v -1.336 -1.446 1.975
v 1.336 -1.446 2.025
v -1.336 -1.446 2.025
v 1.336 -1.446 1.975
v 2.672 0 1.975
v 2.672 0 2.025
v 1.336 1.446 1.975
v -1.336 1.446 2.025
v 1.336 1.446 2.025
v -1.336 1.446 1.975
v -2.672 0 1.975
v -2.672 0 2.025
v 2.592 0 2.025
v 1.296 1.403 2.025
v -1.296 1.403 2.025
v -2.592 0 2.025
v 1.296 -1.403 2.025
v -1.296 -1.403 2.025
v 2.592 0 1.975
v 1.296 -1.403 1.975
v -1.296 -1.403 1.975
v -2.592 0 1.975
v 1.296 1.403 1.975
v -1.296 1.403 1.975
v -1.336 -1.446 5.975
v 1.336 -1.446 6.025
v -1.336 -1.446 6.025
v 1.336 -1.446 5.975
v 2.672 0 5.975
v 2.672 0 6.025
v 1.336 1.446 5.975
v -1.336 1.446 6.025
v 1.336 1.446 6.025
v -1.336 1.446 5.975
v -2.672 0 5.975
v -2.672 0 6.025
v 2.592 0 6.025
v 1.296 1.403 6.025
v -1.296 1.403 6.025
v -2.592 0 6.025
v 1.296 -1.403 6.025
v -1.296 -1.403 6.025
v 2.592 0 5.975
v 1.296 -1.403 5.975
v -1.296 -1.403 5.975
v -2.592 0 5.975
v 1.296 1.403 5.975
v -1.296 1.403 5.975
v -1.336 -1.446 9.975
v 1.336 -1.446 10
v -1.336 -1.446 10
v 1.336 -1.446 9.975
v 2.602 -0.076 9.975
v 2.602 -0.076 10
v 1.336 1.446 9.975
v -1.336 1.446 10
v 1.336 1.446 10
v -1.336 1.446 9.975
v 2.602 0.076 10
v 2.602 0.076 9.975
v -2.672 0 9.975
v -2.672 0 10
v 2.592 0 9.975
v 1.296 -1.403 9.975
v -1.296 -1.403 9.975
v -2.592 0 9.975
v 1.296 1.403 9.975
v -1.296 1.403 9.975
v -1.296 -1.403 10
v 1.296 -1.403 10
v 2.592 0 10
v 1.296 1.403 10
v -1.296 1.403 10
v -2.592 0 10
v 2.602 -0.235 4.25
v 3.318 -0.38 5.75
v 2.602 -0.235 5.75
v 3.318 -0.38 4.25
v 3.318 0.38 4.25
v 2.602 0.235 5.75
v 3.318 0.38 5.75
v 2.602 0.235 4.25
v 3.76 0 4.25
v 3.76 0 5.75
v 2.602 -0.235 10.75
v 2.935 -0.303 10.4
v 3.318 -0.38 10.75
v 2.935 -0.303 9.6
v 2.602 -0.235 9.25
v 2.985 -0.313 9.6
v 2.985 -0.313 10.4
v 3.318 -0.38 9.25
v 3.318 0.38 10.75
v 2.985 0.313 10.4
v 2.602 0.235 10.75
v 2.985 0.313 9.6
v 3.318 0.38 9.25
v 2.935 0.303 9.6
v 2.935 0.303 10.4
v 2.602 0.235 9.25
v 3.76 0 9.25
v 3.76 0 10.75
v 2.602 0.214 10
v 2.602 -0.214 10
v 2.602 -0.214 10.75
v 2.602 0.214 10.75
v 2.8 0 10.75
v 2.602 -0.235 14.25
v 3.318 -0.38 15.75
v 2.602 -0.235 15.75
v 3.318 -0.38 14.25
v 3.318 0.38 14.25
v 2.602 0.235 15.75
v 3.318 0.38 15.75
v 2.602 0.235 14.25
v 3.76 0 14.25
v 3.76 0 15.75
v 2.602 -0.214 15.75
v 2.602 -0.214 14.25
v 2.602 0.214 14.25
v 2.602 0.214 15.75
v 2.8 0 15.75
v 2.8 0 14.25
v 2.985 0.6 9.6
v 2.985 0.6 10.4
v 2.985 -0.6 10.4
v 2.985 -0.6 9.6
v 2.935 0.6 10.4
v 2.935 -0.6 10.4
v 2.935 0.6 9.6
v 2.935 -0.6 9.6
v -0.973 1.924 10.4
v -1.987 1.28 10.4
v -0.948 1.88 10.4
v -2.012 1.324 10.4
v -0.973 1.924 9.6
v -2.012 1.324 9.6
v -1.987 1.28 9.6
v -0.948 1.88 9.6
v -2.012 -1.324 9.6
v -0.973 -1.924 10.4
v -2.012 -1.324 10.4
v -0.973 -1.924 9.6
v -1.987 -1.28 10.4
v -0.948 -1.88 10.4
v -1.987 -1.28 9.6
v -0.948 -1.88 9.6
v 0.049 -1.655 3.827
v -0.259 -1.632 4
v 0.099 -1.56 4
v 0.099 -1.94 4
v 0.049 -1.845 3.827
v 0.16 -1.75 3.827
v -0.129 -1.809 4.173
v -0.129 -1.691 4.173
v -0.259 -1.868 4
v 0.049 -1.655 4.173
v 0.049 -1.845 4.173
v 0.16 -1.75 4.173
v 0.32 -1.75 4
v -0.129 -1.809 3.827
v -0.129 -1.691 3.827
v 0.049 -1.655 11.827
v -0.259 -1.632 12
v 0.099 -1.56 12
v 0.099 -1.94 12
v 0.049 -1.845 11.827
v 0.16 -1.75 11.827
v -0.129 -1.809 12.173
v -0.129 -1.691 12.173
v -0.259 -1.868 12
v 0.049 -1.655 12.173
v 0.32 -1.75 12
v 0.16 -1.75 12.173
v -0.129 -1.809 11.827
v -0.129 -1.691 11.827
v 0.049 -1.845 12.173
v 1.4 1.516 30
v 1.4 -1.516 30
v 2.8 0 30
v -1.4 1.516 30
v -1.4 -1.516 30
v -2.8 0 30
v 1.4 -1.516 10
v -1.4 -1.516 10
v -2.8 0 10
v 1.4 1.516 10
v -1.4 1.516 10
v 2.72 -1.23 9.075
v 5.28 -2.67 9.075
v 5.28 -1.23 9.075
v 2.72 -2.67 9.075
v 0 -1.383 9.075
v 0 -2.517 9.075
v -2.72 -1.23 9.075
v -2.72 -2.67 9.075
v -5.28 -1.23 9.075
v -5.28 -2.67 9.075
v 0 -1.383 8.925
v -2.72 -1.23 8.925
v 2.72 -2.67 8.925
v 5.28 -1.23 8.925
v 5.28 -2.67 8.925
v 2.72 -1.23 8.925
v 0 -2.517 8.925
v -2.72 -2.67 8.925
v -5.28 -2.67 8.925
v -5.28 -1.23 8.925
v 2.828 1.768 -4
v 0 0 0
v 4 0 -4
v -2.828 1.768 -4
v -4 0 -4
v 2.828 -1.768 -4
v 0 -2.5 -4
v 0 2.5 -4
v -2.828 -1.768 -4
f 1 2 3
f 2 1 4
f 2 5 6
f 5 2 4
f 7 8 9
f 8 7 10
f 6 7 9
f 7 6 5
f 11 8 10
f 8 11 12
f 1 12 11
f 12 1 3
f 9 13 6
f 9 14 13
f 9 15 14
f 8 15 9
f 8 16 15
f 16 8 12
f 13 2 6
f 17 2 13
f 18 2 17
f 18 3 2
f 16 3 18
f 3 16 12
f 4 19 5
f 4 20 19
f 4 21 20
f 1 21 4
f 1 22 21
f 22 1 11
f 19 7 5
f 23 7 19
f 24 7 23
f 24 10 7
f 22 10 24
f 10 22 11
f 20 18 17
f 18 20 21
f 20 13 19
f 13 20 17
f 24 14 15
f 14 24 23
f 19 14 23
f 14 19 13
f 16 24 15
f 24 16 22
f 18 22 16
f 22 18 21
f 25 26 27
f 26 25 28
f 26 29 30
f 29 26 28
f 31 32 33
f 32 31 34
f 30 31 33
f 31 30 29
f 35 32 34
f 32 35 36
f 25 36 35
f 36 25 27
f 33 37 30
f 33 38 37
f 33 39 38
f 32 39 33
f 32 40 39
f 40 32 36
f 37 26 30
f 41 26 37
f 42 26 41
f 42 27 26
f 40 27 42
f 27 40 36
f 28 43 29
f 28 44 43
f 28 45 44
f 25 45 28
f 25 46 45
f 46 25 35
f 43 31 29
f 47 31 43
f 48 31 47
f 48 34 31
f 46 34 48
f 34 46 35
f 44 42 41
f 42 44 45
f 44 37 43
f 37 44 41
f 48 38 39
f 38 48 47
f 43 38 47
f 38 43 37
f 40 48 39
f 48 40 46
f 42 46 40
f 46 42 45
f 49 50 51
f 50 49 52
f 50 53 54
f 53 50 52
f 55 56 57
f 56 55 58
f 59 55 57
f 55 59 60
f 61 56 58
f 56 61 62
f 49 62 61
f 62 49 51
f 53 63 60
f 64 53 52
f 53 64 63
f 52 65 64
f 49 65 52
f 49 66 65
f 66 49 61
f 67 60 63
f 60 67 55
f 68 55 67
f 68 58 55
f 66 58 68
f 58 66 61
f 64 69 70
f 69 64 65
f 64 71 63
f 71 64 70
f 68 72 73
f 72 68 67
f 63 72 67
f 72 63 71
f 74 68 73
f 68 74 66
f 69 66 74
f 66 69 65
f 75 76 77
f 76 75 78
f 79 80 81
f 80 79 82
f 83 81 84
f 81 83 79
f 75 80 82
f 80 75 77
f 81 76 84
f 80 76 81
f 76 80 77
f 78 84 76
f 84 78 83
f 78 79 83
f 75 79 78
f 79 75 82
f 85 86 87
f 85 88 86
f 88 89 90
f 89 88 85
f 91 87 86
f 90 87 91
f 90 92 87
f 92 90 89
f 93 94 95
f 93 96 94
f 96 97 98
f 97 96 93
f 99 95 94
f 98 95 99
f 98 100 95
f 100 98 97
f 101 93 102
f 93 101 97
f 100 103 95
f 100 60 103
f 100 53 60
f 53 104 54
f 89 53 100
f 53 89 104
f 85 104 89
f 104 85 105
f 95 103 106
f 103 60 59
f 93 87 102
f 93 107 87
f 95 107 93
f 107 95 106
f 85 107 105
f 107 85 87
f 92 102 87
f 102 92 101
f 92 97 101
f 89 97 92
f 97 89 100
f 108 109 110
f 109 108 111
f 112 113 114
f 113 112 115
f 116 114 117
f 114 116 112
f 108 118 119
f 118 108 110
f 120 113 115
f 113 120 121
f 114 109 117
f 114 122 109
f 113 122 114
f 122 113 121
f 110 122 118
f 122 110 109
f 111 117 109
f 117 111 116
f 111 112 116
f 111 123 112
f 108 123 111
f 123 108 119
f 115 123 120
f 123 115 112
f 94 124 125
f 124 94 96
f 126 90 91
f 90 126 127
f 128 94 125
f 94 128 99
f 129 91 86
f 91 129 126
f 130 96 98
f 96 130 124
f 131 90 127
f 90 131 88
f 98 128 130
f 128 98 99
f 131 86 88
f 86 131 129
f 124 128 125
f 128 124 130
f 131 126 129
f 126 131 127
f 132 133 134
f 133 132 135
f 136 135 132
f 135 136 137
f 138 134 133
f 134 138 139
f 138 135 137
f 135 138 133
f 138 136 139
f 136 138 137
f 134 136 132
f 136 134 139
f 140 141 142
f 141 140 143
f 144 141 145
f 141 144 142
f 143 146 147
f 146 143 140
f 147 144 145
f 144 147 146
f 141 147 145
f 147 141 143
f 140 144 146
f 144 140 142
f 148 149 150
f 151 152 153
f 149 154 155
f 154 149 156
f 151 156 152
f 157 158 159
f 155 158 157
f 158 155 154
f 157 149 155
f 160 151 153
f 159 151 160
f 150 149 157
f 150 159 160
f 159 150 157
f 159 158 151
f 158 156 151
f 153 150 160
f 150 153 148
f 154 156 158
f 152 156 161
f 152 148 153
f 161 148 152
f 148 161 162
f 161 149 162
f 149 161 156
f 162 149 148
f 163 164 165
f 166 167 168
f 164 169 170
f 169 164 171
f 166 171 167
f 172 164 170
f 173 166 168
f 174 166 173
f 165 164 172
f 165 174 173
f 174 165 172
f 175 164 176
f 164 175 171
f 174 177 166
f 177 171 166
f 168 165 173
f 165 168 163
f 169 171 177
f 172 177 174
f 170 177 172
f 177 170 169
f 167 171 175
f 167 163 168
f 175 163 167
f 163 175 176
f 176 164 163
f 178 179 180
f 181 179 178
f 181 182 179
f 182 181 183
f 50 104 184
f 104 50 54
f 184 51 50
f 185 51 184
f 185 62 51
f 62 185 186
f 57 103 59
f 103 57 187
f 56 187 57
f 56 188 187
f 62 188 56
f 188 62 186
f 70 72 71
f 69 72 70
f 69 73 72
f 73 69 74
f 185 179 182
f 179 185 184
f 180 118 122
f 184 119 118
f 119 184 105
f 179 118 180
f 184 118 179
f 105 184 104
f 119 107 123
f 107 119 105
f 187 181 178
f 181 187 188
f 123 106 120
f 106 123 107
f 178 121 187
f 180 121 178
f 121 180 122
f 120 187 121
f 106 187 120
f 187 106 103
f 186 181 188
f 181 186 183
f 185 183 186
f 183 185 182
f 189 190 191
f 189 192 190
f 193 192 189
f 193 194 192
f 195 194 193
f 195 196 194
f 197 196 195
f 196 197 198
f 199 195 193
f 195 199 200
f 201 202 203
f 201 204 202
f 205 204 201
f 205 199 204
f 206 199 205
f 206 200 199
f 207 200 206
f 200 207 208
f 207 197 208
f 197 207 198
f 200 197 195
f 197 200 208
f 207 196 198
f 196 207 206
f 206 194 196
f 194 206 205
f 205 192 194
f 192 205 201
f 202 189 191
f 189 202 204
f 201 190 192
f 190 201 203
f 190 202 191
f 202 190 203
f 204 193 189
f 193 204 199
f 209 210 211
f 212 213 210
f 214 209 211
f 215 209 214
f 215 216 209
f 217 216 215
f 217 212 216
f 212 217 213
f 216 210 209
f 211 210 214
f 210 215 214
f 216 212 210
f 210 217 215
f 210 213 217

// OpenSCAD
// Parámetros generales
FUSELAGE_LENGTH = 20;
FUSELAGE_RADIUS = 1.35;
scale_x = 1.6;
scale_y = 1.0;

// Módulo cono para propulsión
module cone(r, h) {
    cylinder(h=h, r1=r, r2=0, center=true);
}

// Fuselaje ovalado: cilindro escalado + algunos detalles
module fuselage_oval() {
    color([0.25, 0.41, 0.88])  // Azul real
        translate([0,0,FUSELAGE_LENGTH/2])
            scale([scale_x, scale_y, 1])
                cylinder(h=FUSELAGE_LENGTH, r=FUSELAGE_RADIUS + 0.3, center=false);

    // Anillos estructurales (simples)
    for (z = [2, 6, 10, 14, 18]) {
        color([0.41, 0.41, 0.41])
            translate([0, 0, z])
                scale([scale_x, scale_y, 1])
                    torus_ring(FUSELAGE_RADIUS + 0.32, 0.05);
    }

    // Compartimentos cilíndricos externos
    for (z = [5, 10, 15]) {
        color([0.54, 0.27, 0.07])
            translate([(FUSELAGE_RADIUS + 0.6) * scale_x, 0, z])
                scale([scale_x, scale_y, 1])
                    cylinder(h=1.5, r=0.4, center=true);
    }

    // Kevlar layer (translúcido dorado)
    color([0.72, 0.53, 0.04, 0.3])
        translate([0, 0, FUSELAGE_LENGTH / 2])
            scale([scale_x, scale_y, 1])
                cylinder(h=FUSELAGE_LENGTH, r=FUSELAGE_RADIUS + 0.4, center=false);

    // Escudos (aletas)
    for (i = [0 : 2]) {
        angle = i * 120; // grados
        x = cos(angle) * (FUSELAGE_RADIUS + 0.5) * scale_x;
        y = sin(angle) * (FUSELAGE_RADIUS + 0.5) * scale_y;
        color([0.66, 0.66, 0.66, 0.8])
            translate([x, y, FUSELAGE_LENGTH / 2])
                rotate([0, 0, angle])
                    cube([0.05, 1.2, 0.8], center=true);
    }

    // Sensores adicionales
    for (z = [4, 12]) {
        color("orange")
            translate([0, -(FUSELAGE_RADIUS + 0.4)*scale_y, z])
                scale([scale_x, scale_y, 1])
                    sphere(r=0.2);
    }
}

// Función para crear un torus simple (ring) en OpenSCAD
// Approximate with difference of two cylinders
module torus_ring(outer_r, thickness) {
    difference() {
        cylinder(h=thickness, r=outer_r, center=true);
        cylinder(h=thickness+0.1, r=outer_r - thickness, center=true);
    }
}

// Alas ovaladas
module wings_oval() {
    wing_length = 8;
    wing_width = 2.4;
    wing_thickness = 0.15;

    // ala izquierda
    translate([-wing_length/2, -(FUSELAGE_RADIUS + 0.6)*scale_y, FUSELAGE_LENGTH * 0.45])
        scale([scale_x, scale_y, 1])
            color("steelblue")
                hull() {
                    translate([0, 0, 0])
                        cube([wing_length*0.2, wing_width*0.6, wing_thickness], center=true);
                    translate([wing_length/2, 0, 0])
                        cube([wing_length*0.2, wing_width*0.3, wing_thickness], center=true);
                }

    // ala derecha (simétrica)
    translate([wing_length/2, -(FUSELAGE_RADIUS + 0.6)*scale_y, FUSELAGE_LENGTH * 0.45])
        scale([scale_x, scale_y, 1])
            color("steelblue")
                hull() {
                    translate([0, 0, 0])
                        cube([wing_length*0.2, wing_width*0.6, wing_thickness], center=true);
                    translate([-wing_length/2, 0, 0])
                        cube([wing_length*0.2, wing_width*0.3, wing_thickness], center=true);
                }
}

// Payload de propulsión (cono invertido)
module propulsion_payload() {
    base_radius = 2.5;
    height = 4;

    translate([0, 0, -height/2])
        color("dimgray")
            scale([scale_x, scale_y, 1])
                cone(base_radius, height);
}

// Definición de cone (cylinder con r2=0)
module cone(r, h) {
    cylinder(h=h, r1=r, r2=0, center=true);
}

// Ensamblaje final de la nave
module spaceship() {
    fuselage_oval();
    wings_oval();
    propulsion_payload();
}

// Renderiza la nave
spaceship();
